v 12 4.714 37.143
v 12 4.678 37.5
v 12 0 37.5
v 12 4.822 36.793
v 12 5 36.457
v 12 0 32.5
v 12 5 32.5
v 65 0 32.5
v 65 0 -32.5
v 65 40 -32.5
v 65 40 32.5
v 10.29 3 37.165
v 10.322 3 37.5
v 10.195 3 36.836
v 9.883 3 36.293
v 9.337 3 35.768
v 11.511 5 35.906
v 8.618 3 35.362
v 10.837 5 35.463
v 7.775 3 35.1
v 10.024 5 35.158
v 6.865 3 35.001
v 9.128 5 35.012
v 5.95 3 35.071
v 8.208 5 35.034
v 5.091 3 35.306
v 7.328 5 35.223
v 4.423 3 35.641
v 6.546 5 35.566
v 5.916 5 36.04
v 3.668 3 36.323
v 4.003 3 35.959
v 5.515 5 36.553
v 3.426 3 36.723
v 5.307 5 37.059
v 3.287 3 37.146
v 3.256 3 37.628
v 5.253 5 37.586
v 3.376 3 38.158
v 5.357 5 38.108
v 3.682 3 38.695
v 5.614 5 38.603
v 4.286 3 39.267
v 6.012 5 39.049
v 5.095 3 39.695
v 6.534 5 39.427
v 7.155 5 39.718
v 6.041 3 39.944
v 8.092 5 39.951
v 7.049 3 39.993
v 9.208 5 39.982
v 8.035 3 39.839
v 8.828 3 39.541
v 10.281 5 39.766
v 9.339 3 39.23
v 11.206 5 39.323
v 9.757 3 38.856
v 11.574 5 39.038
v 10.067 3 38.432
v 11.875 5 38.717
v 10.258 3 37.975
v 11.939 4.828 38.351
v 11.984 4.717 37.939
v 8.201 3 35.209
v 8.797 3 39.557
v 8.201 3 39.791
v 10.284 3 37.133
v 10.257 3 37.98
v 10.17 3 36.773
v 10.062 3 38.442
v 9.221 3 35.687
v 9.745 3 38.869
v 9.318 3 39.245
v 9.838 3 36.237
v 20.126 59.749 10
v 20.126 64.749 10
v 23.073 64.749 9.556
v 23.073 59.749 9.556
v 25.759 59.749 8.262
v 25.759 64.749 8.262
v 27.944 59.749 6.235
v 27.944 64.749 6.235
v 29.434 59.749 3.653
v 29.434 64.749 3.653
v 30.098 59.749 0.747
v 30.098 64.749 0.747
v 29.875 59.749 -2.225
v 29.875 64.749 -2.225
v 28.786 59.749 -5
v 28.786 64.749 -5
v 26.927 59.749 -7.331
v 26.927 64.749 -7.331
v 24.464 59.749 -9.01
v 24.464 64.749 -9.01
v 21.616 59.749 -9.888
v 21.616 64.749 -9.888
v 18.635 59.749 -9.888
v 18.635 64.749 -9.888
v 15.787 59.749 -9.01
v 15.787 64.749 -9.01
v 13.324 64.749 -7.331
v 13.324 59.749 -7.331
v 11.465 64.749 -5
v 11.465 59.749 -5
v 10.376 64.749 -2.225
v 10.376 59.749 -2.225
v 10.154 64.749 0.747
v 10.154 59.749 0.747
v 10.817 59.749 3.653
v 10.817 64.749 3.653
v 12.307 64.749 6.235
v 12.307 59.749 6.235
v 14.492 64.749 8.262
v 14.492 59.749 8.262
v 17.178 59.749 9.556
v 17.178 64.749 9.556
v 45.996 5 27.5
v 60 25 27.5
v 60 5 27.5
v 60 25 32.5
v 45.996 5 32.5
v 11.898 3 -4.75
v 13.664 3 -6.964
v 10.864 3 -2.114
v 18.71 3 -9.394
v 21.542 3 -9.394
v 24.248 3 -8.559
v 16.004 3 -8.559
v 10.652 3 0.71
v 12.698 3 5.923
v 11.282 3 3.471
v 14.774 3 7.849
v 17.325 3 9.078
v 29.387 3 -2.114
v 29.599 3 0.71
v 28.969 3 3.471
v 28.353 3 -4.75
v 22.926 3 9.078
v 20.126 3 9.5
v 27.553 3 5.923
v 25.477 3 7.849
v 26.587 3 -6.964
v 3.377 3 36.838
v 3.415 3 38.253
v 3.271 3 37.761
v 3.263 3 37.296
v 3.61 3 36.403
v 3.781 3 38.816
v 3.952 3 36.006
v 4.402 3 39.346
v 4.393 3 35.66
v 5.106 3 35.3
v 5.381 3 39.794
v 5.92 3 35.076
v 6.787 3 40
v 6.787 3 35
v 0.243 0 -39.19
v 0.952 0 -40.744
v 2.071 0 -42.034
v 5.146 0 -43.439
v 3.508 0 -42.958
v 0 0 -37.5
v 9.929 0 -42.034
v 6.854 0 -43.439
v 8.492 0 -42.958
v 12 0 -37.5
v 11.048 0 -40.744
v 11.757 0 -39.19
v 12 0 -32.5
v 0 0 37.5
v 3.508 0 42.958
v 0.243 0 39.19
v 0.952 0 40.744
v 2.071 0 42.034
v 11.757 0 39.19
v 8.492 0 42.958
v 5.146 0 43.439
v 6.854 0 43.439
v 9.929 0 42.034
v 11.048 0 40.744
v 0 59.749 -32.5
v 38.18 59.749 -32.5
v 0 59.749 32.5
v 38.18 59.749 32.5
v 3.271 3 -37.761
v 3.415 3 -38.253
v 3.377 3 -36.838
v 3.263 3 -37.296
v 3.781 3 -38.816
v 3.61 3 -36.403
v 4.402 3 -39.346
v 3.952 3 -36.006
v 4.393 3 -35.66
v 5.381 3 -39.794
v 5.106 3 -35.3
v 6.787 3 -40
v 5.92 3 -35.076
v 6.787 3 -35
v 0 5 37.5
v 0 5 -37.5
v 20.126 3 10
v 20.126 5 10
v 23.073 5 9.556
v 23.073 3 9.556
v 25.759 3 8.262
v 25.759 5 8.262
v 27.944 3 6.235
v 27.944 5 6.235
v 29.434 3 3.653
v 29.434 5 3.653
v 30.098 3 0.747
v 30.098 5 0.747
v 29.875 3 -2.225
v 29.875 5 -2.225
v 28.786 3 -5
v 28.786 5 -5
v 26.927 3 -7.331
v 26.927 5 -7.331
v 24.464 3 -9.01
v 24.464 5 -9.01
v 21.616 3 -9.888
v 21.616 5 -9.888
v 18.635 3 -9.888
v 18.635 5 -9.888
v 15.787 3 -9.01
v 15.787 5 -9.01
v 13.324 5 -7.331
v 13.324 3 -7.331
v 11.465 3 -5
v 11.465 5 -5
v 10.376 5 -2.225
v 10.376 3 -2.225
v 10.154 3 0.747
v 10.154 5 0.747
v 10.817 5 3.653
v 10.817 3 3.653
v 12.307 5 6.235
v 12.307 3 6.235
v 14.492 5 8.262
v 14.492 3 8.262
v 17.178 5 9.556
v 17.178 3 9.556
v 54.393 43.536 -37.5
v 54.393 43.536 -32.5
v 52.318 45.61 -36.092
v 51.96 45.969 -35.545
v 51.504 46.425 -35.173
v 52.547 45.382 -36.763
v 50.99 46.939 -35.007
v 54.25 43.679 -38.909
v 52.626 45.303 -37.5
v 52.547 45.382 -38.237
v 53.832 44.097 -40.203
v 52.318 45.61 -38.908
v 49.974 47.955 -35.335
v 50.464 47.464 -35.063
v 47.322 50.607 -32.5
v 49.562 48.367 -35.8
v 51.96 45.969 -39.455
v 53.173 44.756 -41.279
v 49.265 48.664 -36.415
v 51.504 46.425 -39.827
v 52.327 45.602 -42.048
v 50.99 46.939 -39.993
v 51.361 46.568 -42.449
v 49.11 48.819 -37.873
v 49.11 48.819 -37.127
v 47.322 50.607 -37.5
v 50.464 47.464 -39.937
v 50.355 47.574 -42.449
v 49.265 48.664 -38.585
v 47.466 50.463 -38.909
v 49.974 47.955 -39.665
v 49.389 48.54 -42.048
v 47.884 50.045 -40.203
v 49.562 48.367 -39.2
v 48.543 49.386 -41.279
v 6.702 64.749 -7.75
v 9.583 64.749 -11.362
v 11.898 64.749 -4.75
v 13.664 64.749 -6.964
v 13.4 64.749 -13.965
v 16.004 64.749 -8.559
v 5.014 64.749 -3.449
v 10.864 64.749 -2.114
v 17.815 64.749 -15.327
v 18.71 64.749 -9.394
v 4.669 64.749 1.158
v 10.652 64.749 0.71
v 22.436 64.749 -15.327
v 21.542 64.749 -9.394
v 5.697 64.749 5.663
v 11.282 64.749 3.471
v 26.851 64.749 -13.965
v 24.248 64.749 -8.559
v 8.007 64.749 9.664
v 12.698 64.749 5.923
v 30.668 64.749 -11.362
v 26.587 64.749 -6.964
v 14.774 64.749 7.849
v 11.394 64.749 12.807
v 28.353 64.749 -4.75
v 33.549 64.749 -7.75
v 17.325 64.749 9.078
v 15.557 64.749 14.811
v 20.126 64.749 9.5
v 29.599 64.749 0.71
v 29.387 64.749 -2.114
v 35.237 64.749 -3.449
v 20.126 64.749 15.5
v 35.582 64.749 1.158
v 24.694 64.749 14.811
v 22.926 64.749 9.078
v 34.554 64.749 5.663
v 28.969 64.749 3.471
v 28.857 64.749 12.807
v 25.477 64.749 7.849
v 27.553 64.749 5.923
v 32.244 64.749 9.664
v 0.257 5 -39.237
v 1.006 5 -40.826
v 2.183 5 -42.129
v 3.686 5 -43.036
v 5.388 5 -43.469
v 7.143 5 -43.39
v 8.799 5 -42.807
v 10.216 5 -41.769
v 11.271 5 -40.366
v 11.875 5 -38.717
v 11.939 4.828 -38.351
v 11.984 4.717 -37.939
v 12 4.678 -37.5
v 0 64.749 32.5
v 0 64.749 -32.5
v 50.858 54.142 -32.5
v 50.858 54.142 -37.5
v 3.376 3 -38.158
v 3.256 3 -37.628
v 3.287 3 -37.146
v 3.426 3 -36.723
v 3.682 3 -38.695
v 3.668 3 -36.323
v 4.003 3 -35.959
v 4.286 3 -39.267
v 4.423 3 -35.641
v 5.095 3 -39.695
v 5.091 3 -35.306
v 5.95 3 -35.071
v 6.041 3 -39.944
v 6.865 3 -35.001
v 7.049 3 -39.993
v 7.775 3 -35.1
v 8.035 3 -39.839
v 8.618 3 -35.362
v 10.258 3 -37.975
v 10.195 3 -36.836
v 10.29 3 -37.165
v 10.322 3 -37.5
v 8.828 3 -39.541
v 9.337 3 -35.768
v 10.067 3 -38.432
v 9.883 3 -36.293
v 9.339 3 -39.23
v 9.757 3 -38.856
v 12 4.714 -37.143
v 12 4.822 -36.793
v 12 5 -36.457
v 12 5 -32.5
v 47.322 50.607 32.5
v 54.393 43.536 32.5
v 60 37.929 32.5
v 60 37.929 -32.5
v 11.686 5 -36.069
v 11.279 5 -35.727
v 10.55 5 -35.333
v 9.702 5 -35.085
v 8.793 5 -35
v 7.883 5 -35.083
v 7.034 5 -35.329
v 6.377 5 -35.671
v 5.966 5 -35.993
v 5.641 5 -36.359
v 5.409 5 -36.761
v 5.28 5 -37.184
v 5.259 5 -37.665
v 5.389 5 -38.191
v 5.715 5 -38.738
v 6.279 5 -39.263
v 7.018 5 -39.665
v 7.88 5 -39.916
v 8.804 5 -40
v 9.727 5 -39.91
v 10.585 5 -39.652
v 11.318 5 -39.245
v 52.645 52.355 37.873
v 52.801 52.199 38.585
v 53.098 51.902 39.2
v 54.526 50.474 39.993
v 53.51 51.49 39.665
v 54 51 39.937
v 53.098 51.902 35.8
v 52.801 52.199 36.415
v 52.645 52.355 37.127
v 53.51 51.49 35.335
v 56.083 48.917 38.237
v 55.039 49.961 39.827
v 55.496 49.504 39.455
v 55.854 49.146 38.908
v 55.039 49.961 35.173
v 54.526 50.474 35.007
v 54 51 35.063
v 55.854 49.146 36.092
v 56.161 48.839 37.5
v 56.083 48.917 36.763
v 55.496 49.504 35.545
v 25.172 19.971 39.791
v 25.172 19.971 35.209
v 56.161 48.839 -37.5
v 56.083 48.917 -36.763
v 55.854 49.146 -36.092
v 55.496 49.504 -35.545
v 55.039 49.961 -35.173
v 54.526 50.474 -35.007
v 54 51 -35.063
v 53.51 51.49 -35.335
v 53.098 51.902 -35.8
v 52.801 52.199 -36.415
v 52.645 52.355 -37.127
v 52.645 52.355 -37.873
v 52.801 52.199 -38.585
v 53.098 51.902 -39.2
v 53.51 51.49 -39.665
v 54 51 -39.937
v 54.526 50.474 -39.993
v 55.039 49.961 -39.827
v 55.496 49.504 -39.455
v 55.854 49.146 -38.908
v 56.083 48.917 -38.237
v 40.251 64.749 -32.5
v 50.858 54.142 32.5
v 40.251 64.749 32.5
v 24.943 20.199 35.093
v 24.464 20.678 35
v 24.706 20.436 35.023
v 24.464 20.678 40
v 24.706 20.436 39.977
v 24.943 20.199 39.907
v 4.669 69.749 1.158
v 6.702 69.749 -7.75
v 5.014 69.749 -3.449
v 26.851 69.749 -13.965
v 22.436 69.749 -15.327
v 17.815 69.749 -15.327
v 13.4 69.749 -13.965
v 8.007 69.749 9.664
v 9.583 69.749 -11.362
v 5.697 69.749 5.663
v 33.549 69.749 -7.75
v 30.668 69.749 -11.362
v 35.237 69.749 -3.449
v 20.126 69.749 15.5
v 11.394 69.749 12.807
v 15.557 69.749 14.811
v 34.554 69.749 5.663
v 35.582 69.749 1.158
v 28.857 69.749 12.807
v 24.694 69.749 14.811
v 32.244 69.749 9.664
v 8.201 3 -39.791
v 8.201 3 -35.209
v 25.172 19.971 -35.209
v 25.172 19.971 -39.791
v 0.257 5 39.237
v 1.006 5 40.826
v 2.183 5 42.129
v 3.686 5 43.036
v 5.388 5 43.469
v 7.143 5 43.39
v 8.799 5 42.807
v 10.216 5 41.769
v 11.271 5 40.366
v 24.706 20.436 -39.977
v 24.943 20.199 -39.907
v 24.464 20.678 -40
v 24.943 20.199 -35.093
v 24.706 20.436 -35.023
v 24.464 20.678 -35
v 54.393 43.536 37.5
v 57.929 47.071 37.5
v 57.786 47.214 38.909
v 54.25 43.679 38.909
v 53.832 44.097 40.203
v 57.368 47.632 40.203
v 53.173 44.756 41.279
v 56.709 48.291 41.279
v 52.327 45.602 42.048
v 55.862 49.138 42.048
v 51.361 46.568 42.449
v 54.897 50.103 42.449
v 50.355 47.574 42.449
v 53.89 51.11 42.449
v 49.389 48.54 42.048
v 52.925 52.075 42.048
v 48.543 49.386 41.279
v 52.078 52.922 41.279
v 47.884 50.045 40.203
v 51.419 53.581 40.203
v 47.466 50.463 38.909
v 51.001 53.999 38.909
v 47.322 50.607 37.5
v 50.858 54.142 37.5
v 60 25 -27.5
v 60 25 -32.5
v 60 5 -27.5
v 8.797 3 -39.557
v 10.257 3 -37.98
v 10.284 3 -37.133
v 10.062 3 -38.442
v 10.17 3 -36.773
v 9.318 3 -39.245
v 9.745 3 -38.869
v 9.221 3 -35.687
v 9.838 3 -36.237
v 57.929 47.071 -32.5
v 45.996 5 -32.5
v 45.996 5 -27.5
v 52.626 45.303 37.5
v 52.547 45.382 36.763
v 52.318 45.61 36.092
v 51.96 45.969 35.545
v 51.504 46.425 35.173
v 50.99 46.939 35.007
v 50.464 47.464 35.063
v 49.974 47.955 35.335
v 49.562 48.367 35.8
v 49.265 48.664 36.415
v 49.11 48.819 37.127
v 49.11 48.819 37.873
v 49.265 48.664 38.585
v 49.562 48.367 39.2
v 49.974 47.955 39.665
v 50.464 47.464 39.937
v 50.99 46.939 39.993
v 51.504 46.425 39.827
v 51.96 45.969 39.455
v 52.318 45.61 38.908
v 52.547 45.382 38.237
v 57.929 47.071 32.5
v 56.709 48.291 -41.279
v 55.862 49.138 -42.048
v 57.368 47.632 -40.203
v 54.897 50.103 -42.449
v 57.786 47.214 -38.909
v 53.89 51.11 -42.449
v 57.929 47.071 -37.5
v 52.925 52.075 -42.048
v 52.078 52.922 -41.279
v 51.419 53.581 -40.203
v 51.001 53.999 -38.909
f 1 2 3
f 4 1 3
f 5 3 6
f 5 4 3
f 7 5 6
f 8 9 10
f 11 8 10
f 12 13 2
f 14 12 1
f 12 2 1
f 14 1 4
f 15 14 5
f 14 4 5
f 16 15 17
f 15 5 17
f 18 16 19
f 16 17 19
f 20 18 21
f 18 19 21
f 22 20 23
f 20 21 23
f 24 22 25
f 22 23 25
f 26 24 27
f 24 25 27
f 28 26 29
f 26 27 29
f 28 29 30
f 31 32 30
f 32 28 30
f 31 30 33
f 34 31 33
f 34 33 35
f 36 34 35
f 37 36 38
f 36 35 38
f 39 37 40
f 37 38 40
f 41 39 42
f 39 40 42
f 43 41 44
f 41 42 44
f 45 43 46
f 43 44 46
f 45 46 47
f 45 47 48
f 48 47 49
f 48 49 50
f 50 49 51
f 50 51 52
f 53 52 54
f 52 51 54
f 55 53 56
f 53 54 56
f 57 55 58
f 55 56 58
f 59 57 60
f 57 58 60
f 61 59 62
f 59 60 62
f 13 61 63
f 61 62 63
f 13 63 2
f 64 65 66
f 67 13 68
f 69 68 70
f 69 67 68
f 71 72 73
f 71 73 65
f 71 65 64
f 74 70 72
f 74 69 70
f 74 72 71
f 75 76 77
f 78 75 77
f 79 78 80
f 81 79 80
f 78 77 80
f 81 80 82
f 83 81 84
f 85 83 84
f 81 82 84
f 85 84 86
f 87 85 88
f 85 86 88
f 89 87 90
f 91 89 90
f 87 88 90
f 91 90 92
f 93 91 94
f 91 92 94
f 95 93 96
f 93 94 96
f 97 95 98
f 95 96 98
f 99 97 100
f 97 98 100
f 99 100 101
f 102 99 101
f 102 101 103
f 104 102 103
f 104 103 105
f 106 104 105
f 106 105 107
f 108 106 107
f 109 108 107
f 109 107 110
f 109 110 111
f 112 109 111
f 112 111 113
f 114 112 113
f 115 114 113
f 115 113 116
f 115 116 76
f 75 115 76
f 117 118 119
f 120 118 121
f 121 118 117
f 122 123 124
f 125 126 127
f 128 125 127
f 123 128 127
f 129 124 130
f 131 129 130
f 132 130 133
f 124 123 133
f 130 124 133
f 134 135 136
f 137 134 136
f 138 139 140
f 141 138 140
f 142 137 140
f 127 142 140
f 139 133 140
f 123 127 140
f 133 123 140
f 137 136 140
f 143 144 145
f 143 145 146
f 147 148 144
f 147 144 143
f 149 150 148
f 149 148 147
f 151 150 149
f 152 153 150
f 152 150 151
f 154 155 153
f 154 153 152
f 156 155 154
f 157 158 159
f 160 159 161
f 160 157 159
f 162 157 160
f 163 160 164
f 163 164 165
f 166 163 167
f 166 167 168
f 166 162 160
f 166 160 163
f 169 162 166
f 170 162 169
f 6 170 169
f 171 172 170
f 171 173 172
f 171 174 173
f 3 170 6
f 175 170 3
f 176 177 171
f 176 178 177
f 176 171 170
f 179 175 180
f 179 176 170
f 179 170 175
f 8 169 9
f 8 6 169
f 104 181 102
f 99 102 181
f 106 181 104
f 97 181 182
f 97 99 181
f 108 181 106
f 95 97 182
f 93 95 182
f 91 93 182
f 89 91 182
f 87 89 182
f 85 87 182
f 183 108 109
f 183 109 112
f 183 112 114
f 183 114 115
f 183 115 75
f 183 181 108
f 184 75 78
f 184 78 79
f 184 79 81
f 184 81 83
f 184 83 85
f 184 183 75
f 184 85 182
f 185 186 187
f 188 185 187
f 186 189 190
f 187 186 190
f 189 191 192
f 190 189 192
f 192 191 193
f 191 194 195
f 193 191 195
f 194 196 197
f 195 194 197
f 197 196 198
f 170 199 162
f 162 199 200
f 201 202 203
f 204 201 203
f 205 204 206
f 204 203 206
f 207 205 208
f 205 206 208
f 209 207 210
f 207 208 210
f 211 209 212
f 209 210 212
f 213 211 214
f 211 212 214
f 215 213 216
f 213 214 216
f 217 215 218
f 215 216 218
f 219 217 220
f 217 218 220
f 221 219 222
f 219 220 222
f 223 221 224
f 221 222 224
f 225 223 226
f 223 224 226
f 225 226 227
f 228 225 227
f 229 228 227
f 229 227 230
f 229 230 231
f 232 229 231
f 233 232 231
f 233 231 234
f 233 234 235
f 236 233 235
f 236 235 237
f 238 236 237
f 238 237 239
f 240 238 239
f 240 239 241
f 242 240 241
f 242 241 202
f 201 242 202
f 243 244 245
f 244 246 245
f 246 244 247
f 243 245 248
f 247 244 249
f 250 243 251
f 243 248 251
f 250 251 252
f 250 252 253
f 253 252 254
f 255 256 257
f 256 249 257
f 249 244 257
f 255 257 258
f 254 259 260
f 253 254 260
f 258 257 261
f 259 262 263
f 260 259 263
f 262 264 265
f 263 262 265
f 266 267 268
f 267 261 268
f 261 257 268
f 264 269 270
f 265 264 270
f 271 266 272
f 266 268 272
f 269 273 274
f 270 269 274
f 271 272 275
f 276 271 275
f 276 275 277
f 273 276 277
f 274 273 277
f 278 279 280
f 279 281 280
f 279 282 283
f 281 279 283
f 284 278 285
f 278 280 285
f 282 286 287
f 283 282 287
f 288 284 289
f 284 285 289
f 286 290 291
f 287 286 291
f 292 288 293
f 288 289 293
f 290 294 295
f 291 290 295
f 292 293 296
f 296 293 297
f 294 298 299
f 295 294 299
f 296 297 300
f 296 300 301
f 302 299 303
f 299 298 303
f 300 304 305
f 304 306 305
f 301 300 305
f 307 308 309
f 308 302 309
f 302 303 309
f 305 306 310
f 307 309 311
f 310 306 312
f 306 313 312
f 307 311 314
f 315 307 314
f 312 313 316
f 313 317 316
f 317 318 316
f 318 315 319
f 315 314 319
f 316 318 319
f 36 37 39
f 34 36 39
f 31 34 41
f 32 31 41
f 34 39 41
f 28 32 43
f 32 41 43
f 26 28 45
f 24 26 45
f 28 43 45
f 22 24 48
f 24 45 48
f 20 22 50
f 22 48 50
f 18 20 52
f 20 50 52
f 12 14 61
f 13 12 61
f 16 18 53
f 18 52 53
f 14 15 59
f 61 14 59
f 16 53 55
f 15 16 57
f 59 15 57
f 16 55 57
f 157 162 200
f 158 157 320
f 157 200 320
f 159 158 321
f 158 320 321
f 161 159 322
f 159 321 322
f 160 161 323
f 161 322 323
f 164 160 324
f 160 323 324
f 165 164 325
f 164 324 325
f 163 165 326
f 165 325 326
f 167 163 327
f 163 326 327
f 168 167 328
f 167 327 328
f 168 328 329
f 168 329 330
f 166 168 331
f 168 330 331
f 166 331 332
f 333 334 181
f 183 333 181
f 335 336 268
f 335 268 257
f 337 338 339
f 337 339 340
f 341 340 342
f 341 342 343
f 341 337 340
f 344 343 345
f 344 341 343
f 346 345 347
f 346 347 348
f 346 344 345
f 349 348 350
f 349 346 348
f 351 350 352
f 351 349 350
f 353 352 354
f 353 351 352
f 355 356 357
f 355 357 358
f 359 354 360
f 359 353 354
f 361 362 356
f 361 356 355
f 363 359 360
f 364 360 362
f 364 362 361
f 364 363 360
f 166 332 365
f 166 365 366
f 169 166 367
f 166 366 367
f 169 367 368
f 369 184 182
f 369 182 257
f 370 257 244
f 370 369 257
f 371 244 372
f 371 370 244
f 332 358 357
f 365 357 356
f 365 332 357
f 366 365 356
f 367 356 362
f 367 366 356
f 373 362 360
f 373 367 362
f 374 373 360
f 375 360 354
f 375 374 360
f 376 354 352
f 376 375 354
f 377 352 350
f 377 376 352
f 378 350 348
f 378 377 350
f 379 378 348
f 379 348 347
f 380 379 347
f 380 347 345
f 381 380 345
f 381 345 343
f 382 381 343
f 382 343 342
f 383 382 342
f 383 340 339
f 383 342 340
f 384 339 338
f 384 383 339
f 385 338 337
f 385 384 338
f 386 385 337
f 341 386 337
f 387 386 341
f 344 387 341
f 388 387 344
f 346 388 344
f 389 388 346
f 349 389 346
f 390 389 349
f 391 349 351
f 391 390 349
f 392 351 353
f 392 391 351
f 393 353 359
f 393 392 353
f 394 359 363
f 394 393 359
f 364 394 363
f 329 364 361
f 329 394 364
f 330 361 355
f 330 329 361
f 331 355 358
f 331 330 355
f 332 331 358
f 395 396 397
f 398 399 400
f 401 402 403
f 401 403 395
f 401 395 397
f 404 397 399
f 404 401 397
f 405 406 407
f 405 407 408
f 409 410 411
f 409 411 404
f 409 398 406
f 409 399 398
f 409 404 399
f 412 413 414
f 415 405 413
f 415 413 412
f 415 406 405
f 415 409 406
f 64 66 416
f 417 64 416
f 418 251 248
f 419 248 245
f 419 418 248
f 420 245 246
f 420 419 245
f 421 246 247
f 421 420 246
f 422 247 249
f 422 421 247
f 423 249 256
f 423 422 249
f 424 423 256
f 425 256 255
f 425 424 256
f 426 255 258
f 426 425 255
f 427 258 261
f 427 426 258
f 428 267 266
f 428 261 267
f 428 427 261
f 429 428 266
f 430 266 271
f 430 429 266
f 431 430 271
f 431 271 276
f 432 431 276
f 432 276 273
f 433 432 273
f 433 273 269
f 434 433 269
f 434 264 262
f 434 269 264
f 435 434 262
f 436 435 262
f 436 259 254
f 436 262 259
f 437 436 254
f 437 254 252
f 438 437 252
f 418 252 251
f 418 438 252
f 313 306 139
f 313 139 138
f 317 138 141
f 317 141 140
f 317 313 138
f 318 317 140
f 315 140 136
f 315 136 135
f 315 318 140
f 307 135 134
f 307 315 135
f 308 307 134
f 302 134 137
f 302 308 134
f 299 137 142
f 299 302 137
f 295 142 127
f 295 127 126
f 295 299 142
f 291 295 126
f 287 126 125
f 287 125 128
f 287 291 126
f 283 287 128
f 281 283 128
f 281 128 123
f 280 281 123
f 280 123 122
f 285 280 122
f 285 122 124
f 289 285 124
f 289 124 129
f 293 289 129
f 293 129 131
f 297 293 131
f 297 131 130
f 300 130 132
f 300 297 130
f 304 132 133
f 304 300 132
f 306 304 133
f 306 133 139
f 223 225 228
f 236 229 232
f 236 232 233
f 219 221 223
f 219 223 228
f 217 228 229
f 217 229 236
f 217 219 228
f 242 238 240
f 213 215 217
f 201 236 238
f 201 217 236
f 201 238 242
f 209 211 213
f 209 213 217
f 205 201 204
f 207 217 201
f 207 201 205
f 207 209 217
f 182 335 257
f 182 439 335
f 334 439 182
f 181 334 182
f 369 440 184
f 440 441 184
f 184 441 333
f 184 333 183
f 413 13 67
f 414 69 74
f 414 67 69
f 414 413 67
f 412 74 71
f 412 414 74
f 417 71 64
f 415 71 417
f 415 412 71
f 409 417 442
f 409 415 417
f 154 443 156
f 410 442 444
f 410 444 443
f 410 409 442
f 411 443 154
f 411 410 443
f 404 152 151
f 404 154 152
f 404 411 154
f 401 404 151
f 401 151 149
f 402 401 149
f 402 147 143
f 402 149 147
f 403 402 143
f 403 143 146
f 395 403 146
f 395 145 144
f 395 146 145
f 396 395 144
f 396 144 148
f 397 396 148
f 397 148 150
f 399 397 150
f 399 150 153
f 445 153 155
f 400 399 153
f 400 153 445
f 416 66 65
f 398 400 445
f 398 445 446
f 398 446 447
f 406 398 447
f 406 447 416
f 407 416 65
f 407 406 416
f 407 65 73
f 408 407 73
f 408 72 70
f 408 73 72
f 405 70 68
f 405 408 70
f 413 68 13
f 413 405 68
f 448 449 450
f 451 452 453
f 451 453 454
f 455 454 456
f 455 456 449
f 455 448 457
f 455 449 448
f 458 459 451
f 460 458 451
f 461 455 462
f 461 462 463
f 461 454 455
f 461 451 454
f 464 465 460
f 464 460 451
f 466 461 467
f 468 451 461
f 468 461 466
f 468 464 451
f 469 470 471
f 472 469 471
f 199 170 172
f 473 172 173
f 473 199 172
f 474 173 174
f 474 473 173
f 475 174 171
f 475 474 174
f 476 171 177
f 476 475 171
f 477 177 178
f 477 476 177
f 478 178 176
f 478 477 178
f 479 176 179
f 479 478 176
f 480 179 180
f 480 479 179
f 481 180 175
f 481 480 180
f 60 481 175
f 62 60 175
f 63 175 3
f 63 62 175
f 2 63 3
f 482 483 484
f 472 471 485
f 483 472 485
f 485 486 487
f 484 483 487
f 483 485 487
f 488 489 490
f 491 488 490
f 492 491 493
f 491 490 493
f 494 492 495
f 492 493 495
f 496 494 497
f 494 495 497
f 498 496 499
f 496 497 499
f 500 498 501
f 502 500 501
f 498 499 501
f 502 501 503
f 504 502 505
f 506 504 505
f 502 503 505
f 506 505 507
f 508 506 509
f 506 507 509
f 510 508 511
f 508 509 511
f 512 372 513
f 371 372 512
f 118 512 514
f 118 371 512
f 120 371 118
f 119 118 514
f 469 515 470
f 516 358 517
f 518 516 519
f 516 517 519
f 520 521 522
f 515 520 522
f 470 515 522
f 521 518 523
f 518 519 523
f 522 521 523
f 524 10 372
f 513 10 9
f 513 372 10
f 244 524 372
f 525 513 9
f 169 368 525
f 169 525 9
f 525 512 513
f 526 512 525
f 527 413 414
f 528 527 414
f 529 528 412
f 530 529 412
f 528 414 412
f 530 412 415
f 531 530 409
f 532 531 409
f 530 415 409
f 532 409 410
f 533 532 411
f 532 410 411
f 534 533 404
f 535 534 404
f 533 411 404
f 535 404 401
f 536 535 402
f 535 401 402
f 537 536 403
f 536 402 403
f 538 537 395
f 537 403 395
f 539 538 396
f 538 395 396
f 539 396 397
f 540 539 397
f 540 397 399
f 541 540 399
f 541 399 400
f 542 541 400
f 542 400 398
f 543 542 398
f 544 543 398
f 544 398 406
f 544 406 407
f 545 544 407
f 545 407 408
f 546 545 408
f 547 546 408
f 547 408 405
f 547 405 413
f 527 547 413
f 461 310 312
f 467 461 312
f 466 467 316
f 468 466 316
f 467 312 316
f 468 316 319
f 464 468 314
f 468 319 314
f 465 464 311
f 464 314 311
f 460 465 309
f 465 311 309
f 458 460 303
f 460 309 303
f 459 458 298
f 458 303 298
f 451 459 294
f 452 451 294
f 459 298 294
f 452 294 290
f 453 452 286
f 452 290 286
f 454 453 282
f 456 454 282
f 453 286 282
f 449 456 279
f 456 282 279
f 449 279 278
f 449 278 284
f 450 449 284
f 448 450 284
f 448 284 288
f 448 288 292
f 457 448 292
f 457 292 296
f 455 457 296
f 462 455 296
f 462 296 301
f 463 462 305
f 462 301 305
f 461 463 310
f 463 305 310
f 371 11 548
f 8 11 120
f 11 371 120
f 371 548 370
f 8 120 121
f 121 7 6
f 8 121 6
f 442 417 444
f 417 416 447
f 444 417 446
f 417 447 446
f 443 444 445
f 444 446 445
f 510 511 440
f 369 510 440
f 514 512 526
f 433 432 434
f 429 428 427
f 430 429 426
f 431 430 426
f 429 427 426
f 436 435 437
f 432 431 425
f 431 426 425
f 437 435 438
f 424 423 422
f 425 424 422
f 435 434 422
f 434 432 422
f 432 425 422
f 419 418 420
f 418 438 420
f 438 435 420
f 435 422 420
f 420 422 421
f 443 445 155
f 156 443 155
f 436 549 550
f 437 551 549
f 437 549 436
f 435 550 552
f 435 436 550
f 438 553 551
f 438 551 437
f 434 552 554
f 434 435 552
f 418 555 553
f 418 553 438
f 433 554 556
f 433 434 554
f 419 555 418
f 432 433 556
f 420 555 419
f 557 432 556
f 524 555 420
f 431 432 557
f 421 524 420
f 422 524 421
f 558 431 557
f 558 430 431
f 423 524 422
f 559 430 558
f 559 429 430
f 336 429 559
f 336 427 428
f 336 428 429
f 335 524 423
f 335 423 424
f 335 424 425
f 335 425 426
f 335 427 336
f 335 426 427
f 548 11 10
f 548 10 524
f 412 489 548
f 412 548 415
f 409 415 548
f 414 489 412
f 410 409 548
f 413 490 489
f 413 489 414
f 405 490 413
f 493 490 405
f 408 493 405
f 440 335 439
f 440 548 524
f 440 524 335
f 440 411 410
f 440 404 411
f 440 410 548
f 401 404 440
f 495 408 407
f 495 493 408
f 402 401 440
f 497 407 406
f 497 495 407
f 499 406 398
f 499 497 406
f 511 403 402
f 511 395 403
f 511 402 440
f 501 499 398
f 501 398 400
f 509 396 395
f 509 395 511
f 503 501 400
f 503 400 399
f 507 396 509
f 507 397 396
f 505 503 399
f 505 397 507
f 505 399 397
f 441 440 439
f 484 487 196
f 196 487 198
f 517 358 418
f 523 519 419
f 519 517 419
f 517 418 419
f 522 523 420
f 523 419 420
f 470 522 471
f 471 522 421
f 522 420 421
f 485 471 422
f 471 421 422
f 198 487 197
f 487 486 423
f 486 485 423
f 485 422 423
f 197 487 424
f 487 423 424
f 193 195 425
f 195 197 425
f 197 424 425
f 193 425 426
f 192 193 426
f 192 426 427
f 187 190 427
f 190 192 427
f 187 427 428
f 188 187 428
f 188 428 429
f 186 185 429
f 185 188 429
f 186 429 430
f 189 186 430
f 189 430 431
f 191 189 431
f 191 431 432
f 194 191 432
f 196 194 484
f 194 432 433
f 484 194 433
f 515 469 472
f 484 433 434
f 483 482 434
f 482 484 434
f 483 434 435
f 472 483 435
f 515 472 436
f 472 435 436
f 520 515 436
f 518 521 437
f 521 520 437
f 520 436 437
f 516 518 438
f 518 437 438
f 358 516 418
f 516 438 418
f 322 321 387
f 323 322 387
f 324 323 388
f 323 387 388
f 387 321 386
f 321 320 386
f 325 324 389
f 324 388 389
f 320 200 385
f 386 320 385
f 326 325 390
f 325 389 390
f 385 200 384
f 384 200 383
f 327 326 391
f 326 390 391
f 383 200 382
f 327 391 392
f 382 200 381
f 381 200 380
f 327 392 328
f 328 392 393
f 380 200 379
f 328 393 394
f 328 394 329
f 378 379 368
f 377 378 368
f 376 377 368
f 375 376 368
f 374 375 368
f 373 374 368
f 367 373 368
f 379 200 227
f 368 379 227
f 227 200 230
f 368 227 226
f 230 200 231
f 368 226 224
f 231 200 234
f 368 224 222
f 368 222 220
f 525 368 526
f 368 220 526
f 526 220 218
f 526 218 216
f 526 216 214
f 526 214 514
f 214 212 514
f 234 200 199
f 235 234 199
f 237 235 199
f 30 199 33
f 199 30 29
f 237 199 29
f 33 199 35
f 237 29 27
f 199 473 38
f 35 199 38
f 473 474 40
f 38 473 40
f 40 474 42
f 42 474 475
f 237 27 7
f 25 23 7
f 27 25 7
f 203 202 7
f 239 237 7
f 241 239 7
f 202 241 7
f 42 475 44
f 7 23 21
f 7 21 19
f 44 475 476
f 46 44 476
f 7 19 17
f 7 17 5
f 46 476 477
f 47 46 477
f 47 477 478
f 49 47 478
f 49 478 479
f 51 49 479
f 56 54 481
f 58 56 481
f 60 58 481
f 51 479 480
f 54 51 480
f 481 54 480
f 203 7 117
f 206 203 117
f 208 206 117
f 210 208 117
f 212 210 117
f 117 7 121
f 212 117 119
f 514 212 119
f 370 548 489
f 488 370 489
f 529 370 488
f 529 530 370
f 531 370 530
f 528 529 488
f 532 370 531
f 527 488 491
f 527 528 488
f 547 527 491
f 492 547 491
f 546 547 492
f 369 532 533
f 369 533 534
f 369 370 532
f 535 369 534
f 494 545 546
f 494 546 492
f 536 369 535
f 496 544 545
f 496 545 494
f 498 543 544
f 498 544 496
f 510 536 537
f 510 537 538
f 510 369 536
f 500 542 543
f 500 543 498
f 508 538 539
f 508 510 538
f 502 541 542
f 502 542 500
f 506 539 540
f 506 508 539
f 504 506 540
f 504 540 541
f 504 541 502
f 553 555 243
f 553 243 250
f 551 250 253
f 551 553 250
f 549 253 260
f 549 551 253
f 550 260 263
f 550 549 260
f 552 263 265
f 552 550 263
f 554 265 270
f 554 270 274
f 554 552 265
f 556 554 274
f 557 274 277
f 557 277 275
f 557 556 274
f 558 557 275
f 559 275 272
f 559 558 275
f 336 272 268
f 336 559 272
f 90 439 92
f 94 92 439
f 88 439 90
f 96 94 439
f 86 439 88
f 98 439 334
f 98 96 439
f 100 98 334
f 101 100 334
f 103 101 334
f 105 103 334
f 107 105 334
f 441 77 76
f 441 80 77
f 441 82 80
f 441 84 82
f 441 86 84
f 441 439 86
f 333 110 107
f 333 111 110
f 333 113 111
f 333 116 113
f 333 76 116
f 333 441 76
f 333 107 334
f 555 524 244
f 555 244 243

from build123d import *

# Parameters (mm, degrees)
BOSS_EXTRUDE1_DEPTH              = 32.5
RIB1_REACH                       = 114.438
SKETCH2_WALL_W                   = 251.292337958
SKETCH2_WALL_H                   = 5
BOSS_EXTRUDE2_DEPTH              = 5
BOSS_EXTRUDE3_DEPTH              = 5
CUT_EXTRUDE1_REACH               = 91.051
CUT_EXTRUDE1_OFFSET_FROM_SURFACE = 3
SKETCH5_R                        = 2.5
BOSS_EXTRUDE4_REACH              = 88.051
SKETCH6_R                        = 2.5
SKETCH7_R                        = 10
CUT_EXTRUDE2_DEPTH               = 61.748737342
SKETCH8_R                        = 9.5
BOSS_EXTRUDE5_DEPTH              = 61.748737342
SKETCH9_R                        = 15.5
BOSS_EXTRUDE6_DEPTH              = 5
CUT_EXTRUDE_THIN1_DEPTH          = 127.736484003
CUT_EXTRUDE_THIN1_DEPTH_BACK     = 127.736484003


with BuildPart() as part:
    # Sketch1 → Boss-Extrude1 (new, symmetric)
    with BuildSketch(Plane.XY):
        Polygon((0, 0), (65, 0), (65, 40), (40.251262658, 64.748737342), (0, 64.748737342), (0, 59.748737342), (38.180194847, 59.748737342), (60, 37.928932188), (60, 5), (0, 5), align=None)
    extrude(amount=BOSS_EXTRUDE1_DEPTH, both=True)

    # Sketch2 wall → Rib1 (add, up to next)
    with BuildSketch(Plane(origin=(52.997924618, 15, 32.5), x_dir=(-0.573576436346, -0.819152044293, 0), z_dir=(0.819152044293, -0.573576436346, 0)), mode=Mode.PRIVATE) as rib1_sk1:
        with Locations((0, 2.5)):
            Rectangle(SKETCH2_WALL_W, SKETCH2_WALL_H)
    rib1_tool1 = extrude(rib1_sk1.sketch, amount=RIB1_REACH, mode=Mode.PRIVATE) - part.part
    rib1 = rib1_tool1.solids().sort_by_distance((52.997924618, 15, 32.5))[0]
    add(rib1)

    # Mirror1: Rib1 across plane
    add(rib1.mirror(Plane.XY))

    # Sketch3 → Boss-Extrude2 (add)
    with BuildSketch(Plane(origin=(52.5, 52.5, 0), x_dir=(0, 0, -1), z_dir=(0.707106781186546, 0.707106781186549, 0))):
        with BuildLine():
            Line((-32.5, -7.67766953), (-37.5, -7.67766953))
            ThreePointArc((-37.5, -7.67766953), (-42.5, -2.67766953), (-37.5, 2.32233047))
            Line((-37.5, 2.32233047), (-32.5, 2.32233047))
            Line((-32.5, 2.32233047), (-32.5, -7.67766953))
        make_face()
    boss_extrude2 = extrude(amount=-BOSS_EXTRUDE2_DEPTH)

    # Mirror2: Boss-Extrude2 across plane
    add(boss_extrude2.mirror(Plane.XY))

    # Sketch4 → Boss-Extrude3 (add)
    with BuildSketch(Plane(origin=(0, 5, 0), x_dir=(1, 0, 0), z_dir=(0, 1, 0))):
        with BuildLine():
            Line((0, -32.5), (0, -37.5))
            ThreePointArc((0, -37.5), (6, -43.5), (12, -37.5))
            Line((12, -37.5), (12, -32.5))
            Line((12, -32.5), (0, -32.5))
        make_face()
    boss_extrude3 = extrude(amount=-BOSS_EXTRUDE3_DEPTH)

    # Mirror3: Boss-Extrude3 across plane
    add(boss_extrude3.mirror(Plane.XY))

    # Cut-Extrude1: up to this face of the body (flat: up to its plane, moved by the offset)
    cut_extrude1_end = Plane(part.part.faces().sort_by_distance((31.114413521, 0, 0))[0]).offset(-CUT_EXTRUDE1_OFFSET_FROM_SURFACE)
    # Sketch5 → Cut-Extrude1 (cut, up to the picked face)
    with BuildSketch(Plane(origin=(52.5, 52.5, 0), x_dir=(0, 0, -1), z_dir=(0.707106781186546, 0.707106781186549, 0)), mode=Mode.PRIVATE) as cut_extrude1_sk1:
        with Locations(Location((-37.5, -2.67766953, 0), (0, 0, 270))):
            Circle(SKETCH5_R)
    cut_extrude1_tool1 = split(extrude(cut_extrude1_sk1.sketch, amount=-CUT_EXTRUDE1_REACH, mode=Mode.PRIVATE), bisect_by=cut_extrude1_end, keep=Keep.BOTH, mode=Mode.PRIVATE)
    cut_extrude1 = cut_extrude1_tool1.solids().sort_by(Axis((54.393398, 50.606602, 37.5), (-0.707106781186546, -0.707106781186549, 0)))[0]
    add(cut_extrude1, mode=Mode.SUBTRACT)

    # Mirror4: Cut-Extrude1 across plane
    add(cut_extrude1.mirror(Plane.XY), mode=Mode.SUBTRACT)

    # Sketch7 → Cut-Extrude2 (cut)
    with BuildSketch(Plane(origin=(0, 64.748737342, 0), x_dir=(1, 0, 0), z_dir=(0, 1, 0))):
        with Locations(Location((20.125631329, 0, 0), (0, 0, 270))):
            Circle(SKETCH7_R)
    extrude(amount=-CUT_EXTRUDE2_DEPTH, mode=Mode.SUBTRACT)


with BuildPart() as body_2:
    # Boss-Extrude4: up to this plane
    boss_extrude4_end = Plane(origin=(0, 3, -32.5), z_dir=(0, -1, 0))
    # Sketch6 → Boss-Extrude4 (new, up to the surface)
    with BuildSketch(Plane(origin=(52.5, 52.5, 0), x_dir=(0, 0, -1), z_dir=(0.707106781186546, 0.707106781186549, 0)), mode=Mode.PRIVATE) as boss_extrude4_sk1:
        with Locations(Location((-37.5, -2.67766953, 0), (0, 0, 270))):
            Circle(SKETCH6_R)
    boss_extrude4_tool1 = split(extrude(boss_extrude4_sk1.sketch, amount=-BOSS_EXTRUDE4_REACH, mode=Mode.PRIVATE), bisect_by=boss_extrude4_end, keep=Keep.BOTH, mode=Mode.PRIVATE)
    add(boss_extrude4_tool1.solids().sort_by_distance((54.393398, 50.606602, 37.5))[0])


with BuildPart() as body_3:
    # Mirror7: mirrored copy
    add(body_2.part.mirror(Plane.XY))


with BuildPart() as body_4:
    # Sketch8 → Boss-Extrude5 (new body)
    with BuildSketch(Plane(origin=(0, 64.748737342, 0), x_dir=(1, 0, 0), z_dir=(0, 1, 0))):
        with Locations(Location((20.125631329, 0, 0), (0, 0, 270))):
            Circle(SKETCH8_R)
    extrude(amount=-BOSS_EXTRUDE5_DEPTH)


with BuildPart() as body_5:
    # Sketch9 → Boss-Extrude6 (new body)
    with BuildSketch(Plane(origin=(0, 64.748737342, 0), x_dir=(1, 0, 0), z_dir=(0, 1, 0))):
        with Locations(Location((20.125631329, 0, 0), (0, 0, 270))):
            Circle(SKETCH9_R)
    extrude(amount=BOSS_EXTRUDE6_DEPTH)


with BuildPart() as body_4_1:
    add(body_4.part)

    # Combine1: union body 5
    add(body_5.part)


with BuildPart() as cut_extrude_thin1_tool:
    # Sketch12 → Cut-Extrude-Thin1 (new, two sides: drawn at the far end of the back side and taken through both)
    with BuildSketch(Plane(origin=(0, 0, -40), x_dir=(-1, 0, 0), z_dir=(0, 0, -1)).offset(-CUT_EXTRUDE_THIN1_DEPTH_BACK)):
        Polygon((-24.464466094, 20.67766953), (-6.786796564, 3), (-7.493903346, 2.292893219), (-25.171572875, 19.970562748), align=None)
    extrude(amount=CUT_EXTRUDE_THIN1_DEPTH + CUT_EXTRUDE_THIN1_DEPTH_BACK)


with BuildPart() as body_3_1:
    add(body_3.part)

    # Cut-Extrude-Thin1: cut by cut_extrude_thin1_tool
    add(cut_extrude_thin1_tool.part, mode=Mode.SUBTRACT)


with BuildPart() as body_2_1:
    add(body_2.part)

    # Cut-Extrude-Thin1: cut by cut_extrude_thin1_tool
    add(cut_extrude_thin1_tool.part, mode=Mode.SUBTRACT)


solid = Compound([part.part, body_4_1.part, body_3_1.part, body_2_1.part])
